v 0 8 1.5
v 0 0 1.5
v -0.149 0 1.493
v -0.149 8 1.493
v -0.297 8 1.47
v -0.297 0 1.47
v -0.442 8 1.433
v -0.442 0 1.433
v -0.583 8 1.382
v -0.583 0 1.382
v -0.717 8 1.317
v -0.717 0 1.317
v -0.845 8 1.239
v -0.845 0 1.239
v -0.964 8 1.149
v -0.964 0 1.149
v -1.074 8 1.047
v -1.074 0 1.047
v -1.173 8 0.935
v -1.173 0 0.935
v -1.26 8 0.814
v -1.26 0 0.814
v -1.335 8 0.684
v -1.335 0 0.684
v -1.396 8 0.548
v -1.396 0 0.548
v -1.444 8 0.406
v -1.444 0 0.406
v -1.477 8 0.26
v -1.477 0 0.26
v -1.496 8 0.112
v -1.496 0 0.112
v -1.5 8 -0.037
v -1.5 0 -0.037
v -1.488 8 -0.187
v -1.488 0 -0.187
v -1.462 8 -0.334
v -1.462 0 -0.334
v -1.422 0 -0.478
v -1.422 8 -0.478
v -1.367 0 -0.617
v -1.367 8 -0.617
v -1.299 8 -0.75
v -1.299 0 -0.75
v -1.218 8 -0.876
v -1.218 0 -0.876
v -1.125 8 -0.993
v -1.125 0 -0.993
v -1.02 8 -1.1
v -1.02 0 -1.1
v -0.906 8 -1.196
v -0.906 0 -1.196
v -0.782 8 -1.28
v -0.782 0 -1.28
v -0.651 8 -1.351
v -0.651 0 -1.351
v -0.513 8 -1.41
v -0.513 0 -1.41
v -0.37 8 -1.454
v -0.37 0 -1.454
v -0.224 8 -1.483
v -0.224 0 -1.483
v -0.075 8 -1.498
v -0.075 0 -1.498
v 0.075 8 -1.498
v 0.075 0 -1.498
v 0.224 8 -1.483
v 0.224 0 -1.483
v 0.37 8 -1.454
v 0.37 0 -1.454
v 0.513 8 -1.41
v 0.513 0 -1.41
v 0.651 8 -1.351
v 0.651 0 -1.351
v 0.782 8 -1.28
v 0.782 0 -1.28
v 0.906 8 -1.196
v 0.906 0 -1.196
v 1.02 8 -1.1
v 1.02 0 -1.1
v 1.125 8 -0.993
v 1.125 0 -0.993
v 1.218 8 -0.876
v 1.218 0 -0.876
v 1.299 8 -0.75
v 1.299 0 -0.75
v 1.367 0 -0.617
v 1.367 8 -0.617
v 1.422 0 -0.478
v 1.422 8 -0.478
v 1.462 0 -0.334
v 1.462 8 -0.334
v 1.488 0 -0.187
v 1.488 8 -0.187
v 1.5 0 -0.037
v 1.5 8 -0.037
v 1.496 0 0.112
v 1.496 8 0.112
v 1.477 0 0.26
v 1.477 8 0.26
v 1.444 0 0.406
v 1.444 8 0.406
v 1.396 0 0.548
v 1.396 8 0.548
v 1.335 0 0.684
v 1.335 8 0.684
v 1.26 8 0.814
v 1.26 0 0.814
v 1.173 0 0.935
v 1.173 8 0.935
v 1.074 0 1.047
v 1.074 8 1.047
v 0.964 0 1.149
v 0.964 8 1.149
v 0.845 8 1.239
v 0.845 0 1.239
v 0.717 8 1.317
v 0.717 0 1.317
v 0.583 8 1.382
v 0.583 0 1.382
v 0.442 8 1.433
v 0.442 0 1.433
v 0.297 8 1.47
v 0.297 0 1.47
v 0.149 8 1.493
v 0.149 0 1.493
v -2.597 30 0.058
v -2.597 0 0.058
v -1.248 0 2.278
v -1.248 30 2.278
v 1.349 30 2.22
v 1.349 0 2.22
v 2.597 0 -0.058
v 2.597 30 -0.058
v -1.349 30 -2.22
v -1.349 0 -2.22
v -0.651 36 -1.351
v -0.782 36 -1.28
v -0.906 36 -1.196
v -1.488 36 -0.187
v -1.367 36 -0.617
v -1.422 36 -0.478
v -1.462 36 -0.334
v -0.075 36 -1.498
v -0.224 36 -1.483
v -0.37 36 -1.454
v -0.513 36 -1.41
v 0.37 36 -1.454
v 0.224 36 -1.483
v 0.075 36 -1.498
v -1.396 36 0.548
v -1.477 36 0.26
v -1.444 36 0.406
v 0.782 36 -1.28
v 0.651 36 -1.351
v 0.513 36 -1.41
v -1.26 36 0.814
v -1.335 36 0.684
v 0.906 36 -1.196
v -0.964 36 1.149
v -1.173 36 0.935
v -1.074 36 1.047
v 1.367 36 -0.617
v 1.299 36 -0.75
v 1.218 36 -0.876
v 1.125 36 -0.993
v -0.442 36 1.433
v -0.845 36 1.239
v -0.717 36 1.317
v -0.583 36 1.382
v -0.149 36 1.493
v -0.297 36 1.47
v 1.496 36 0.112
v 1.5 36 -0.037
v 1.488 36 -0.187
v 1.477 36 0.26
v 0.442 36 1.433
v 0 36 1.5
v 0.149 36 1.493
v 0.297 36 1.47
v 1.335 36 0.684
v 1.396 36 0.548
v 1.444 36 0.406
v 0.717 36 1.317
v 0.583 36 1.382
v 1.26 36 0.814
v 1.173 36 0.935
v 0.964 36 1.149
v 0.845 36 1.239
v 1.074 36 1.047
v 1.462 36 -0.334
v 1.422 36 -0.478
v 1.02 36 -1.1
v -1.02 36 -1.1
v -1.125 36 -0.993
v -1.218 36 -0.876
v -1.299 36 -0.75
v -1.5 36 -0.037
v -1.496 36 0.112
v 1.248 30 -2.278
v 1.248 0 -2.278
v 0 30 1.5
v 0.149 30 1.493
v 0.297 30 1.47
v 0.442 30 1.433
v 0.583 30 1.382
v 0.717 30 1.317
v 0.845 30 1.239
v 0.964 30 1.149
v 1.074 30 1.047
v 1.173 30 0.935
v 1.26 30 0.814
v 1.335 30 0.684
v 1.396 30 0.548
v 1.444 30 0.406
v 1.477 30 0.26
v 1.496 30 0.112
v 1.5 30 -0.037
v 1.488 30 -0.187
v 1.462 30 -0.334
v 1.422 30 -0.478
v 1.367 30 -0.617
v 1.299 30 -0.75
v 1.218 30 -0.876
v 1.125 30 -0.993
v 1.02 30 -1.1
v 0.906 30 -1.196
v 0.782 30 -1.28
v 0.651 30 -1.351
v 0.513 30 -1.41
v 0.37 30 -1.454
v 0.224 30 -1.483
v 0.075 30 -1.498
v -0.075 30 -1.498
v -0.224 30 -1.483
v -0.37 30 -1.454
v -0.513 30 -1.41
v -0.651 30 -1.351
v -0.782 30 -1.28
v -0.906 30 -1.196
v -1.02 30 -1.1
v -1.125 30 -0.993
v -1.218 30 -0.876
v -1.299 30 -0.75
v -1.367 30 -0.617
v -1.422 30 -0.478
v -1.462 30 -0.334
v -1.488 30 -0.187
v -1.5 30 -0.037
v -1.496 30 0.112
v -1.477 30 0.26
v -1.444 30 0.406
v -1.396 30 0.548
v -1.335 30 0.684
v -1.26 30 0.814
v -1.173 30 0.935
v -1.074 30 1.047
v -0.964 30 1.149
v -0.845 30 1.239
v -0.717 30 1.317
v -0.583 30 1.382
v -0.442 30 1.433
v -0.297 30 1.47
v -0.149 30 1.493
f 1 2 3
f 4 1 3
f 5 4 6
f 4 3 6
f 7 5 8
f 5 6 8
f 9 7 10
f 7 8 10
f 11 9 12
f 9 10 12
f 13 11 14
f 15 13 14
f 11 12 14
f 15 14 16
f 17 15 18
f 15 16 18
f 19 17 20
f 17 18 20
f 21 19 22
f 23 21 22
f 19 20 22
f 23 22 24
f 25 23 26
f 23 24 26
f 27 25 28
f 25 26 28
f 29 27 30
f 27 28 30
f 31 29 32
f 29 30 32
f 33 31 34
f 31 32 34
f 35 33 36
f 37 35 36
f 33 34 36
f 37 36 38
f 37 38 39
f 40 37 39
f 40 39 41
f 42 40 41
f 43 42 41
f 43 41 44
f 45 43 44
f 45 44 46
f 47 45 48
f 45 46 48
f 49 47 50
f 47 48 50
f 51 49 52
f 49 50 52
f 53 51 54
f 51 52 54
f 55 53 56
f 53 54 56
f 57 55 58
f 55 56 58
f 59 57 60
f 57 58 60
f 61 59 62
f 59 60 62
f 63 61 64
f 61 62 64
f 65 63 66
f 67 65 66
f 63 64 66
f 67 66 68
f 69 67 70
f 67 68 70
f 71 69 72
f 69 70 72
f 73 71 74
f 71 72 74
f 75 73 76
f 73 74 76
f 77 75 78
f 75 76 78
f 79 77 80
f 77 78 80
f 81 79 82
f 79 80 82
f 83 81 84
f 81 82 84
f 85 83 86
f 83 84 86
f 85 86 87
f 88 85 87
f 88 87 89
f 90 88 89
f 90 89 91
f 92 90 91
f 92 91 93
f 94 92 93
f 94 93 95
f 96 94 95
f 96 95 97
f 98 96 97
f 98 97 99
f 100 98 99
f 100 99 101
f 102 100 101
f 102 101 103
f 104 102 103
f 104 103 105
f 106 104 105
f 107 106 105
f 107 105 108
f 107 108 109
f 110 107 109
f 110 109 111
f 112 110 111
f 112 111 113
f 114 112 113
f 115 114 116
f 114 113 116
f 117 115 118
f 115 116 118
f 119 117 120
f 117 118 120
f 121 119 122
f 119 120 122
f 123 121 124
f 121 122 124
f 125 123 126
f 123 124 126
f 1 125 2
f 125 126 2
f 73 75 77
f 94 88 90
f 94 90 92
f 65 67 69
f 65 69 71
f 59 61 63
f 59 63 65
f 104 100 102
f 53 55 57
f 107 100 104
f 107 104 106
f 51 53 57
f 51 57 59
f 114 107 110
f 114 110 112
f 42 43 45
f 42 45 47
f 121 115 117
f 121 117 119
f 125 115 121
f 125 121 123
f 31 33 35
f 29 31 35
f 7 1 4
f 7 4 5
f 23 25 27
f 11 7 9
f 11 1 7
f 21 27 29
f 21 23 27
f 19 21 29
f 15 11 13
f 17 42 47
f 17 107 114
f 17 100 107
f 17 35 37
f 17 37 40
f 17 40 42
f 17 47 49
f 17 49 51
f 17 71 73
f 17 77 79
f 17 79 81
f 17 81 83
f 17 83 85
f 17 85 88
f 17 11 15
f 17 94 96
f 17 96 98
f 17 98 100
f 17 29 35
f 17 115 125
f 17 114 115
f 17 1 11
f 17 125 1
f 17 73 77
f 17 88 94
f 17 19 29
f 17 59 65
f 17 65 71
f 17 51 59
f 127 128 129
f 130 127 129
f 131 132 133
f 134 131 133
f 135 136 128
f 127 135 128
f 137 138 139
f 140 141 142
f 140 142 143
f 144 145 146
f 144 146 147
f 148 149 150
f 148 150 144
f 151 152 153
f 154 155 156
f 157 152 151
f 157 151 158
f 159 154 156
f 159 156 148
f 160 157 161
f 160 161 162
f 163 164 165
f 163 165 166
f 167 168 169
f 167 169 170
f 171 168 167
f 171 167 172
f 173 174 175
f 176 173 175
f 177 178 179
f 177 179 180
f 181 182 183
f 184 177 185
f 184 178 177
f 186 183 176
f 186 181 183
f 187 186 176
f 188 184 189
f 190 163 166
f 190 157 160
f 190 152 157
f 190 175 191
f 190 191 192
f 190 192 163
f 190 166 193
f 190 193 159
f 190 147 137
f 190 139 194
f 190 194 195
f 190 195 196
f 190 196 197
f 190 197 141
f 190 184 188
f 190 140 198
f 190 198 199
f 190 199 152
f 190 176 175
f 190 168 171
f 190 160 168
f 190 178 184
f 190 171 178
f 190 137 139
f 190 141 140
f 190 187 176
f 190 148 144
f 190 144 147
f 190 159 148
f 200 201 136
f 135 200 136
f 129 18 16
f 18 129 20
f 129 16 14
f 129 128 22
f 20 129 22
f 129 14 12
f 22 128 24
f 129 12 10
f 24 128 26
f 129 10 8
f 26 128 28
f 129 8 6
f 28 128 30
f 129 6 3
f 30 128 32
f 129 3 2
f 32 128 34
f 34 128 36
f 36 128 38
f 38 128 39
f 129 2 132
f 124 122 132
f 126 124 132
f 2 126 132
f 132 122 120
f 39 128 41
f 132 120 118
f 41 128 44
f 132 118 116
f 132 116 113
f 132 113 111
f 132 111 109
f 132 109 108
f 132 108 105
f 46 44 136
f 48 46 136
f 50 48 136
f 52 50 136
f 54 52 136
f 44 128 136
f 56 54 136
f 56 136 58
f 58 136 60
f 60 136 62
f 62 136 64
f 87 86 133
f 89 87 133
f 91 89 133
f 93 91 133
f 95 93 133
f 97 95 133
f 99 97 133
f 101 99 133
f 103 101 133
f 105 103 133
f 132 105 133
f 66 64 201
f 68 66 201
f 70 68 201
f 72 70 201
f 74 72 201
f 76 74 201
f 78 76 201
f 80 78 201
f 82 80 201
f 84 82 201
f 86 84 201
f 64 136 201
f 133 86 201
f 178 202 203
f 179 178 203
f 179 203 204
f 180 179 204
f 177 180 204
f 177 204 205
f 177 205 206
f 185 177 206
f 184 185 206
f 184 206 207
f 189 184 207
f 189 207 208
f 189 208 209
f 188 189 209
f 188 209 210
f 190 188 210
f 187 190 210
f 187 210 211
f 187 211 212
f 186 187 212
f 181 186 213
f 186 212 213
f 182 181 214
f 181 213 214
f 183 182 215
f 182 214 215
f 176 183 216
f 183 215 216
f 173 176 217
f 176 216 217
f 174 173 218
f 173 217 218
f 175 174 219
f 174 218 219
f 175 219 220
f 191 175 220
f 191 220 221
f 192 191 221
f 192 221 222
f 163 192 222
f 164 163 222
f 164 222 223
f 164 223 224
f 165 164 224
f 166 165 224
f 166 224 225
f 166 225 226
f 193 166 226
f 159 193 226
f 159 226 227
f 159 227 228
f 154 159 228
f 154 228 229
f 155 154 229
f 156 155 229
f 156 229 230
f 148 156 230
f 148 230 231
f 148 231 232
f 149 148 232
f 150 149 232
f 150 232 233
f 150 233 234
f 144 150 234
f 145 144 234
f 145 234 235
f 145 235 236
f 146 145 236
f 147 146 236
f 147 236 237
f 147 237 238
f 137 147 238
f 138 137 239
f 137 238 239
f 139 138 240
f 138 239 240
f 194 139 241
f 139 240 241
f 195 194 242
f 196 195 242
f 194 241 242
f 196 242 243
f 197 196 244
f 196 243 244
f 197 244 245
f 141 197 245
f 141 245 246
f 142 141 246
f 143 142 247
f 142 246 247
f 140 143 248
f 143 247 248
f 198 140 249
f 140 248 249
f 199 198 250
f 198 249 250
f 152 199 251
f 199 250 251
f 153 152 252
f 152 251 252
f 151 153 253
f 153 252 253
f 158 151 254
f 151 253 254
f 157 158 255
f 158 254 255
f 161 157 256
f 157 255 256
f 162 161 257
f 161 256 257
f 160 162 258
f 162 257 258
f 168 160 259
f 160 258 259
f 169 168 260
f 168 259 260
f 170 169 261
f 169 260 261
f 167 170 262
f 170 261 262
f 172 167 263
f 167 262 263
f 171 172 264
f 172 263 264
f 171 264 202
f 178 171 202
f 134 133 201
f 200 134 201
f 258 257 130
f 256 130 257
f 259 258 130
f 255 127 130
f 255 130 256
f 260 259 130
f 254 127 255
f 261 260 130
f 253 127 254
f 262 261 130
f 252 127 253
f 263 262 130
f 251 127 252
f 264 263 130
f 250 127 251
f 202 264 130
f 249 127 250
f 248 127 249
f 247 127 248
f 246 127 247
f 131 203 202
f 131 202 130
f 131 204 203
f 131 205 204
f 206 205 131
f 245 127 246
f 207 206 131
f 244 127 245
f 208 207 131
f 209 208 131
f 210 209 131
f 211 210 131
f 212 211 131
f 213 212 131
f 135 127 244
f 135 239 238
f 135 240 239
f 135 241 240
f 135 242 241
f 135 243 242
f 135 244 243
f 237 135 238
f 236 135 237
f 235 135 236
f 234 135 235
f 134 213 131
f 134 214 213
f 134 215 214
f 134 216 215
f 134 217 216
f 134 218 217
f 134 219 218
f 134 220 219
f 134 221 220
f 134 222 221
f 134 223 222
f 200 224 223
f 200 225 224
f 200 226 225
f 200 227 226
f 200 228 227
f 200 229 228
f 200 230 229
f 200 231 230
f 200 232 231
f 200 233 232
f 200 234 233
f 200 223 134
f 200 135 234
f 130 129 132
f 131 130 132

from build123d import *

# Parameters (mm, degrees)
SKETCH_1_R          = 1.5
EXTRUDE_1_DEPTH     = 30
SKETCH_1_2_R        = 1.5
EXTRUDE_2_DEPTH     = 36
SKETCH_2_R          = 1.5
CUT_EXTRUDE_1_DEPTH = 8


with BuildPart() as part:
    # 草图1 → 凸台-拉伸1 (new body)
    with BuildSketch(Plane(origin=(0, 0, 0), x_dir=(1, 0, 0), z_dir=(0, 1, 0))):
        Polygon((1.248465648, 2.278449808), (-1.348962591, 2.220427871), (-2.597428239, -0.058021937), (-1.248465648, -2.278449808), (1.348962591, -2.220427871), (2.597428239, 0.058021937), align=None)
        Circle(SKETCH_1_R, mode=Mode.SUBTRACT)
    extrude(amount=EXTRUDE_1_DEPTH)

    # 草图1<2> → 凸台-拉伸2 (add)
    with BuildSketch(Plane(origin=(0, 0, 0), x_dir=(1, 0, 0), z_dir=(0, 1, 0))):
        Circle(SKETCH_1_2_R)
    extrude(amount=EXTRUDE_2_DEPTH)

    # 草图2 → 切除-拉伸1 (cut)
    with BuildSketch(Plane.XZ):
        Circle(SKETCH_2_R)
    extrude(amount=-CUT_EXTRUDE_1_DEPTH, mode=Mode.SUBTRACT)


solid = part.part
